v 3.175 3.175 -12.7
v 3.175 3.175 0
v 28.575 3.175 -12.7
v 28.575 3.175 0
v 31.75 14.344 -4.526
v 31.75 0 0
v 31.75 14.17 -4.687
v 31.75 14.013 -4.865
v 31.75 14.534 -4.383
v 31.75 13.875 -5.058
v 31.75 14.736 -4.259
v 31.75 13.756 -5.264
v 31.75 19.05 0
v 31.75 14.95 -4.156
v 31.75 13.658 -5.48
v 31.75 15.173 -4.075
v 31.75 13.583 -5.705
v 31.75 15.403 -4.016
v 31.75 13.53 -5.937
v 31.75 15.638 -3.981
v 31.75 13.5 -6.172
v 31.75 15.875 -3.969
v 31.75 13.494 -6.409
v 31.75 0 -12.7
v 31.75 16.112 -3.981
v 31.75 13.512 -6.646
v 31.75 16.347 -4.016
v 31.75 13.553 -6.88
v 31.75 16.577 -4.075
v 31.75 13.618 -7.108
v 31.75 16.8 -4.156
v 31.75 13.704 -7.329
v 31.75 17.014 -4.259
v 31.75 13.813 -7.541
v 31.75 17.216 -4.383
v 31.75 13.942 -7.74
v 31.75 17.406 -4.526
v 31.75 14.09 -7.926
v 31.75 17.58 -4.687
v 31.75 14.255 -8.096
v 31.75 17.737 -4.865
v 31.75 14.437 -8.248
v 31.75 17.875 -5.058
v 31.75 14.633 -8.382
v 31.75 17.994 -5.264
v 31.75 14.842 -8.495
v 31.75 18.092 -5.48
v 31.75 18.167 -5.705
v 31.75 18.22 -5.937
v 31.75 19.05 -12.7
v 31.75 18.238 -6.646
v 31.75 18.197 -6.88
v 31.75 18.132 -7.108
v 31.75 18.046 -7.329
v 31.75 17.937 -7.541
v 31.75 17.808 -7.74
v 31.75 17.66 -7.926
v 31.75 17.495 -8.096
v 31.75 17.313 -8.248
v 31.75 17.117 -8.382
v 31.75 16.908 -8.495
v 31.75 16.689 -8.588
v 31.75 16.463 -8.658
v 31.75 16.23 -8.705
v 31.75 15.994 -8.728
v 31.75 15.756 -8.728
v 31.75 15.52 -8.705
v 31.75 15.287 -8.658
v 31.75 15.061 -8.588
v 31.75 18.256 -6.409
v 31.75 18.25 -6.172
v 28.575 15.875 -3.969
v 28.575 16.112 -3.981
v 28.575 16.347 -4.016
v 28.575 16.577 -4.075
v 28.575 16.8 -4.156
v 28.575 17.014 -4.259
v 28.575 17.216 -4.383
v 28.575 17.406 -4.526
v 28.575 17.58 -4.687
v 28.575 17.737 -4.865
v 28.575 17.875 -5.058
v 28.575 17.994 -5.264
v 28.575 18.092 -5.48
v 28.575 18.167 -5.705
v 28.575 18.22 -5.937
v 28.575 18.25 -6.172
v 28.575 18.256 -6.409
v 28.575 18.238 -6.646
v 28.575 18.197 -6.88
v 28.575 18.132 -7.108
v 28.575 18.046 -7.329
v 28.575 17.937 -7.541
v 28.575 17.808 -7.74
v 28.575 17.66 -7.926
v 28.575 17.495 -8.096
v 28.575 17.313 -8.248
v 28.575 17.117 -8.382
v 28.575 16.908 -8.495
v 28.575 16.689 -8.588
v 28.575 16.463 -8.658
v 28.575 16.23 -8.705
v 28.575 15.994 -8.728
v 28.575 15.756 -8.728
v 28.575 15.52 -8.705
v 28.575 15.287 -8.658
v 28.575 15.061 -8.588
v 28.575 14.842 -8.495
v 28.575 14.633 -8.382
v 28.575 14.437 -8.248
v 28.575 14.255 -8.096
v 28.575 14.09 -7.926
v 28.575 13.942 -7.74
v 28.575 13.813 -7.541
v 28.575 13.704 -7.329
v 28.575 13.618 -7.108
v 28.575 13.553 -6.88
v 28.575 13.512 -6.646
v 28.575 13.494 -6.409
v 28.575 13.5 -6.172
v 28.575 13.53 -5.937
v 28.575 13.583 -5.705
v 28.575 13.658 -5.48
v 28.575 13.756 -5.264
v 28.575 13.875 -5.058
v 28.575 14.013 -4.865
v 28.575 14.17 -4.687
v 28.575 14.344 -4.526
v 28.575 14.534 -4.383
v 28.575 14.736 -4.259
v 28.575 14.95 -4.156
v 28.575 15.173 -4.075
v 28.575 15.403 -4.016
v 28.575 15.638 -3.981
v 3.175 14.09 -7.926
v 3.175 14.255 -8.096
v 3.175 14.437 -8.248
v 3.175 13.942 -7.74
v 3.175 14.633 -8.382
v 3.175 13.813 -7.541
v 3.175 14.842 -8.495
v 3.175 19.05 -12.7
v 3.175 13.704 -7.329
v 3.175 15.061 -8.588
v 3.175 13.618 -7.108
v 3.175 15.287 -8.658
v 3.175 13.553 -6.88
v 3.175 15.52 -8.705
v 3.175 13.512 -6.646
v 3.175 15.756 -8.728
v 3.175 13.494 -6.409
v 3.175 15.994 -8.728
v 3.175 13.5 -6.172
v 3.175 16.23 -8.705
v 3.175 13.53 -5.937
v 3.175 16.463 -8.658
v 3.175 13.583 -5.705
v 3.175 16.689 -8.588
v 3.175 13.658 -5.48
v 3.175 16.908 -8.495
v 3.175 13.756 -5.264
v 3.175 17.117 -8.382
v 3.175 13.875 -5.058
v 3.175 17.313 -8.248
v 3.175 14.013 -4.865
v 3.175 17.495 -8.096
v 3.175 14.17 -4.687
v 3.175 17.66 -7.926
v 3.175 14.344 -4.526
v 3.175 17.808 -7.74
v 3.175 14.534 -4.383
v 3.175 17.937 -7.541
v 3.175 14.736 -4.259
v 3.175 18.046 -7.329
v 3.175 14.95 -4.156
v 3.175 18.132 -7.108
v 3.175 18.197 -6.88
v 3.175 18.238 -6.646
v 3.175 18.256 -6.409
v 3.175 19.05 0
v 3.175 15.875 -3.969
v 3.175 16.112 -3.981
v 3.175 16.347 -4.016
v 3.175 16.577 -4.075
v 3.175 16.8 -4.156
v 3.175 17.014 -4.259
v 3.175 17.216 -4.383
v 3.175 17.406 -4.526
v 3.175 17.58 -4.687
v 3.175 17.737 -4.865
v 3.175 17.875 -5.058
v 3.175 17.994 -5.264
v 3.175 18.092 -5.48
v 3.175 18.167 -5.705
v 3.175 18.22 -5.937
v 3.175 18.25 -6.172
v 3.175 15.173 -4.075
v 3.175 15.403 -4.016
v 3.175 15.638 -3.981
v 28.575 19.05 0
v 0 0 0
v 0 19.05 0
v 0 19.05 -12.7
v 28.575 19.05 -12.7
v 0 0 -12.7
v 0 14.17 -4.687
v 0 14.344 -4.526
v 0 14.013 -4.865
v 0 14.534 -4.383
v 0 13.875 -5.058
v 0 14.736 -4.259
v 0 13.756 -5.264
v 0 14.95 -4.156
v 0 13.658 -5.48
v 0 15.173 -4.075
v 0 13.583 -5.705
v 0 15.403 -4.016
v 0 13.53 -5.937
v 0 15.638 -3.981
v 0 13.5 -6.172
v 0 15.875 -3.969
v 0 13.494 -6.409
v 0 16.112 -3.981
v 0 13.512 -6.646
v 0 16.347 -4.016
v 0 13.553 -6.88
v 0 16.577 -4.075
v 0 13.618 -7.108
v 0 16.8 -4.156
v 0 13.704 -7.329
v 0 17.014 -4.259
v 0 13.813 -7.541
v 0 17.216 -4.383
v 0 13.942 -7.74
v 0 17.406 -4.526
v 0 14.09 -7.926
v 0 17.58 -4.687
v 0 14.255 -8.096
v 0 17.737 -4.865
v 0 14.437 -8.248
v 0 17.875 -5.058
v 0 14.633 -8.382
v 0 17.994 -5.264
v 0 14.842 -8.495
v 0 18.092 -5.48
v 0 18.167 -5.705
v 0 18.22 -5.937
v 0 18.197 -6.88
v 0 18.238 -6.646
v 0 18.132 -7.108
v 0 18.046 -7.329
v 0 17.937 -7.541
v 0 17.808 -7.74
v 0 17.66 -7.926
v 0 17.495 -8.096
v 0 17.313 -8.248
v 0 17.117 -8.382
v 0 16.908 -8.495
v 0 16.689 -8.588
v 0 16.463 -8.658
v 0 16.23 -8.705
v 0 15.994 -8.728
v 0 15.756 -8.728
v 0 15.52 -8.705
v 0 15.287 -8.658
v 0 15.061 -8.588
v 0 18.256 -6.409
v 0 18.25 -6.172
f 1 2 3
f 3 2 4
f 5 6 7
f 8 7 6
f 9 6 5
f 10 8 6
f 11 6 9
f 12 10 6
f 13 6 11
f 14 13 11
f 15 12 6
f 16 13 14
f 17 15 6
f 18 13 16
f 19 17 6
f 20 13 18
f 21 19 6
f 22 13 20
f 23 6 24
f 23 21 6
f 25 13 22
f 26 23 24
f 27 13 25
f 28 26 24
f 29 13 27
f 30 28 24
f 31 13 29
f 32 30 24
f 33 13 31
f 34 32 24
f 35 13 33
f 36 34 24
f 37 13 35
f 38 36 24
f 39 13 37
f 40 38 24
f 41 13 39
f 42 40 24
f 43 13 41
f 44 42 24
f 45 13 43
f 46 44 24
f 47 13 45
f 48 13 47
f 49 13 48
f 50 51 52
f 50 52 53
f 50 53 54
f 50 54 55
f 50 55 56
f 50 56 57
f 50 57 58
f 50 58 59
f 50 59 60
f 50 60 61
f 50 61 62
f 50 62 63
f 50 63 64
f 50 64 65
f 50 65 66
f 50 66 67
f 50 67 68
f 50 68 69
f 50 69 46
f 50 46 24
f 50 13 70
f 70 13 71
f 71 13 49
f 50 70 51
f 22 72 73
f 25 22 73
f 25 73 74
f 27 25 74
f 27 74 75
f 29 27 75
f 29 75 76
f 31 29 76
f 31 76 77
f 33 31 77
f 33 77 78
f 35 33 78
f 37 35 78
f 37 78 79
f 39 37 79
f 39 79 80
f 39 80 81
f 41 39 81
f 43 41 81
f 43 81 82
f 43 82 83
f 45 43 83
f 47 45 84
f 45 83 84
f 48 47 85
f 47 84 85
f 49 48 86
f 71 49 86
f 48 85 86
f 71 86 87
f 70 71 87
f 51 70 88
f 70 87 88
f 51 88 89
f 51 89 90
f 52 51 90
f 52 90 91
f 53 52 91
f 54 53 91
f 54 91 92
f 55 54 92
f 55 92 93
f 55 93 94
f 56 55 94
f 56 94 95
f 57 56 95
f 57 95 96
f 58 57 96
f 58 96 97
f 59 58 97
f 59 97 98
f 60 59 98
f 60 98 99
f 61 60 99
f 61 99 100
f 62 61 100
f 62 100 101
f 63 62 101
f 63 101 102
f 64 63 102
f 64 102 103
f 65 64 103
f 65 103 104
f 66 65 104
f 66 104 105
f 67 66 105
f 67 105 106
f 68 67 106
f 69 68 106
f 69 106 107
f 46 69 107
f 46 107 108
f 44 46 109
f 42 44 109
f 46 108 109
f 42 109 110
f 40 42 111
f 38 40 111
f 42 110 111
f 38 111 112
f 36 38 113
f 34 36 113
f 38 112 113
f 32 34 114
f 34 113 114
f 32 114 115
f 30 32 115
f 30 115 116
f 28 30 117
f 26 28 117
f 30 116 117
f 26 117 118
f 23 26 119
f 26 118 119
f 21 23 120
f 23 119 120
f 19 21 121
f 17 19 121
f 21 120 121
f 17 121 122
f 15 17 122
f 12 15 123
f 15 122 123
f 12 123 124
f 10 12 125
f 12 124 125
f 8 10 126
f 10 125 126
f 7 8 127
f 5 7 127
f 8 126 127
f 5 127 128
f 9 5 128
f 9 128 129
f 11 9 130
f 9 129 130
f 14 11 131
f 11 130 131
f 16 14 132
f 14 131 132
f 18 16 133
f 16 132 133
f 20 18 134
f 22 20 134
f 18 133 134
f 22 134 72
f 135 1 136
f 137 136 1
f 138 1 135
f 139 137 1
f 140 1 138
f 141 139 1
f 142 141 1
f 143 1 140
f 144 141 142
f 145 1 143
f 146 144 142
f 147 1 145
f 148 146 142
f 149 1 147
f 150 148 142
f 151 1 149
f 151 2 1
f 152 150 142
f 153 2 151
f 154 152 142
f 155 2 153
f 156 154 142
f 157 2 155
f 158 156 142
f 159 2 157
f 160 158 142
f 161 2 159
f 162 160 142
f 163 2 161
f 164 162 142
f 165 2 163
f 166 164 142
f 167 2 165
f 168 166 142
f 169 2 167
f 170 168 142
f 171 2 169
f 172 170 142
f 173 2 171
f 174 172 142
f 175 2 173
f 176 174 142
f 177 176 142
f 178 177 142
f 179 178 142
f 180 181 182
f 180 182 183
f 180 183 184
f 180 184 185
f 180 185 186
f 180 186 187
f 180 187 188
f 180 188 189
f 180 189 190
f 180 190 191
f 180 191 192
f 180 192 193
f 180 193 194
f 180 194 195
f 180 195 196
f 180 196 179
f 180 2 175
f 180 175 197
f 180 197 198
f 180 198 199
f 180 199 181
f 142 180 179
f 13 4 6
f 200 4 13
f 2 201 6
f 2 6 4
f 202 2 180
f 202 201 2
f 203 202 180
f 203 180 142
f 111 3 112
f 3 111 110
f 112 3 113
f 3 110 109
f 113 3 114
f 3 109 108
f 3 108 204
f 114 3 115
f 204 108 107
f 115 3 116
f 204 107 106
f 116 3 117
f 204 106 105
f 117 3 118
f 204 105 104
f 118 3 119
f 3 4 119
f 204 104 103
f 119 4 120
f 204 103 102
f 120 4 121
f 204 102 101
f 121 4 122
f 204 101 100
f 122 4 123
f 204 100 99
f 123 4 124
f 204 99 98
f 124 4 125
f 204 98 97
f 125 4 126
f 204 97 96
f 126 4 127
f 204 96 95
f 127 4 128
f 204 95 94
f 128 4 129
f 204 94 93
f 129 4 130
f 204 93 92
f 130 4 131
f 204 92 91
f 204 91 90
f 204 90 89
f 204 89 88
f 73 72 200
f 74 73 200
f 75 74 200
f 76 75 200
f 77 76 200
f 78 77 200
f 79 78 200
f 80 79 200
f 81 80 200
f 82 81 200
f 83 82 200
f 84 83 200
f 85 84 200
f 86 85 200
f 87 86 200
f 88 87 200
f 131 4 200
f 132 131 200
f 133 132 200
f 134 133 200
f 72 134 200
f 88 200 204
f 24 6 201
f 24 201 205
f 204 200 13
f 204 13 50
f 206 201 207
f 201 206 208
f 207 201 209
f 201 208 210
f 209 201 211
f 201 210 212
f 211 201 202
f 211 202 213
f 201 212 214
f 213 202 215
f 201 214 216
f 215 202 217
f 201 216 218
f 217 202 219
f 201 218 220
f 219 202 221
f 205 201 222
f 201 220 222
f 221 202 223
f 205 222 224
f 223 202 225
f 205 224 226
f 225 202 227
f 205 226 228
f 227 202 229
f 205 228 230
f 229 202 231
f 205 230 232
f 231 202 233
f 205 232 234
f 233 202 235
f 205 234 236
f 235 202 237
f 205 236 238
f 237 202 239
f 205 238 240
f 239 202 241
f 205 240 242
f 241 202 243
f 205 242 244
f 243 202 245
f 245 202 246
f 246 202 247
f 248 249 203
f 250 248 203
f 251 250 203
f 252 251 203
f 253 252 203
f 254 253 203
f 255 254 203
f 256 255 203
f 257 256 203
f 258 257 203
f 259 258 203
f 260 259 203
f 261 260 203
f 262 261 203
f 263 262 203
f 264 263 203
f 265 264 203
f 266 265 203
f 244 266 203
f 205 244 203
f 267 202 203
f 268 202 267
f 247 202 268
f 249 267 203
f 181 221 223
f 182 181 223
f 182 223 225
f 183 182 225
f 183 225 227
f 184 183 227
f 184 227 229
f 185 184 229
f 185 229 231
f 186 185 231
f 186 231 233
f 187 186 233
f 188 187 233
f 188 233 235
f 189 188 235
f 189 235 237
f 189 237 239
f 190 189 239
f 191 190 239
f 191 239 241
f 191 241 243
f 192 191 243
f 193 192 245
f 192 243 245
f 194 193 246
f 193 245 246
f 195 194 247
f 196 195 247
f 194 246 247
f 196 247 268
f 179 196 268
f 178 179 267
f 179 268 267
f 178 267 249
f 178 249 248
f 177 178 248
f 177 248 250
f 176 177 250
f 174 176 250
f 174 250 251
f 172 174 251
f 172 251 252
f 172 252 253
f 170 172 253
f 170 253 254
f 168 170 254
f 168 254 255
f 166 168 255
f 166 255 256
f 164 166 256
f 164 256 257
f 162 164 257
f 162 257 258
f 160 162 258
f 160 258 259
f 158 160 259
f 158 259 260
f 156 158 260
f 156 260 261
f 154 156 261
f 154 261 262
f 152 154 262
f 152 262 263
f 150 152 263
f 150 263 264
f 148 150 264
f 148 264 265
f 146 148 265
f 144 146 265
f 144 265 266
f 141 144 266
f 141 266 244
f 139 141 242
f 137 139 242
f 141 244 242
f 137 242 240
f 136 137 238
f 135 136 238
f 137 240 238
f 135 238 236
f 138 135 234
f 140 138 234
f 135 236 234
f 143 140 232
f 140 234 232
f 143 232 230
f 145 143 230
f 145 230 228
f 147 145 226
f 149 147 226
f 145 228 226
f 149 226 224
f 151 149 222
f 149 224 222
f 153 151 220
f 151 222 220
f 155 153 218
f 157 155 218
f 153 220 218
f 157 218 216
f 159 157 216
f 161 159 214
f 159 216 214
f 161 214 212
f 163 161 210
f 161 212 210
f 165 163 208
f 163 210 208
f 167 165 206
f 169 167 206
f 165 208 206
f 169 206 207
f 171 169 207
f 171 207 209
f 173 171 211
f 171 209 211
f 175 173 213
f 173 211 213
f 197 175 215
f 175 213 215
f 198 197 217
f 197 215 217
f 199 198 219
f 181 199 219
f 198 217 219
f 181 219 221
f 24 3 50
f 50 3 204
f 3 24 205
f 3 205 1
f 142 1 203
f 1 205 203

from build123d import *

# Parameters (mm, degrees)
SKETCH1_W                      = 12.7
SKETCH1_H                      = 19.05
BOSS_EXTRUDE1_DEPTH            = 31.75
CUT_EXTRUDE1_REACH             = 41.144
SKETCH2_W                      = 25.4
SKETCH2_H                      = 15.875
F_3_16_0_1875_DIAMETER_HOLE1_D = 4.7625


with BuildPart() as part:
    # Sketch1 → Boss-Extrude1 (new body)
    with BuildSketch(Plane(origin=(0, 0, 0), x_dir=(0, 0, -1), z_dir=(1, 0, 0))):
        with Locations((6.35, 9.525)):
            Rectangle(SKETCH1_W, SKETCH1_H)
    extrude(amount=BOSS_EXTRUDE1_DEPTH)

    # Sketch2 → Cut-Extrude1 (cut, up to next)
    with BuildSketch(Plane.XY, mode=Mode.PRIVATE) as cut_extrude1_sk1:
        with Locations((15.875, 11.1125)):
            Rectangle(SKETCH2_W, SKETCH2_H)
    cut_extrude1_tool1 = extrude(cut_extrude1_sk1.sketch, amount=-CUT_EXTRUDE1_REACH, mode=Mode.PRIVATE) & part.part
    add(cut_extrude1_tool1.solids().sort_by_distance((15.875, 11.1125, 0))[0], mode=Mode.SUBTRACT)

    # 3/16 (0.1875) Diameter Hole1 (through all)
    with Locations(Plane(origin=(31.75, 0, 0), x_dir=(0, 0, -1), z_dir=(1, 0, 0))):
        with Locations((6.35, 15.875)):
            Hole(F_3_16_0_1875_DIAMETER_HOLE1_D / 2)


solid = part.part
